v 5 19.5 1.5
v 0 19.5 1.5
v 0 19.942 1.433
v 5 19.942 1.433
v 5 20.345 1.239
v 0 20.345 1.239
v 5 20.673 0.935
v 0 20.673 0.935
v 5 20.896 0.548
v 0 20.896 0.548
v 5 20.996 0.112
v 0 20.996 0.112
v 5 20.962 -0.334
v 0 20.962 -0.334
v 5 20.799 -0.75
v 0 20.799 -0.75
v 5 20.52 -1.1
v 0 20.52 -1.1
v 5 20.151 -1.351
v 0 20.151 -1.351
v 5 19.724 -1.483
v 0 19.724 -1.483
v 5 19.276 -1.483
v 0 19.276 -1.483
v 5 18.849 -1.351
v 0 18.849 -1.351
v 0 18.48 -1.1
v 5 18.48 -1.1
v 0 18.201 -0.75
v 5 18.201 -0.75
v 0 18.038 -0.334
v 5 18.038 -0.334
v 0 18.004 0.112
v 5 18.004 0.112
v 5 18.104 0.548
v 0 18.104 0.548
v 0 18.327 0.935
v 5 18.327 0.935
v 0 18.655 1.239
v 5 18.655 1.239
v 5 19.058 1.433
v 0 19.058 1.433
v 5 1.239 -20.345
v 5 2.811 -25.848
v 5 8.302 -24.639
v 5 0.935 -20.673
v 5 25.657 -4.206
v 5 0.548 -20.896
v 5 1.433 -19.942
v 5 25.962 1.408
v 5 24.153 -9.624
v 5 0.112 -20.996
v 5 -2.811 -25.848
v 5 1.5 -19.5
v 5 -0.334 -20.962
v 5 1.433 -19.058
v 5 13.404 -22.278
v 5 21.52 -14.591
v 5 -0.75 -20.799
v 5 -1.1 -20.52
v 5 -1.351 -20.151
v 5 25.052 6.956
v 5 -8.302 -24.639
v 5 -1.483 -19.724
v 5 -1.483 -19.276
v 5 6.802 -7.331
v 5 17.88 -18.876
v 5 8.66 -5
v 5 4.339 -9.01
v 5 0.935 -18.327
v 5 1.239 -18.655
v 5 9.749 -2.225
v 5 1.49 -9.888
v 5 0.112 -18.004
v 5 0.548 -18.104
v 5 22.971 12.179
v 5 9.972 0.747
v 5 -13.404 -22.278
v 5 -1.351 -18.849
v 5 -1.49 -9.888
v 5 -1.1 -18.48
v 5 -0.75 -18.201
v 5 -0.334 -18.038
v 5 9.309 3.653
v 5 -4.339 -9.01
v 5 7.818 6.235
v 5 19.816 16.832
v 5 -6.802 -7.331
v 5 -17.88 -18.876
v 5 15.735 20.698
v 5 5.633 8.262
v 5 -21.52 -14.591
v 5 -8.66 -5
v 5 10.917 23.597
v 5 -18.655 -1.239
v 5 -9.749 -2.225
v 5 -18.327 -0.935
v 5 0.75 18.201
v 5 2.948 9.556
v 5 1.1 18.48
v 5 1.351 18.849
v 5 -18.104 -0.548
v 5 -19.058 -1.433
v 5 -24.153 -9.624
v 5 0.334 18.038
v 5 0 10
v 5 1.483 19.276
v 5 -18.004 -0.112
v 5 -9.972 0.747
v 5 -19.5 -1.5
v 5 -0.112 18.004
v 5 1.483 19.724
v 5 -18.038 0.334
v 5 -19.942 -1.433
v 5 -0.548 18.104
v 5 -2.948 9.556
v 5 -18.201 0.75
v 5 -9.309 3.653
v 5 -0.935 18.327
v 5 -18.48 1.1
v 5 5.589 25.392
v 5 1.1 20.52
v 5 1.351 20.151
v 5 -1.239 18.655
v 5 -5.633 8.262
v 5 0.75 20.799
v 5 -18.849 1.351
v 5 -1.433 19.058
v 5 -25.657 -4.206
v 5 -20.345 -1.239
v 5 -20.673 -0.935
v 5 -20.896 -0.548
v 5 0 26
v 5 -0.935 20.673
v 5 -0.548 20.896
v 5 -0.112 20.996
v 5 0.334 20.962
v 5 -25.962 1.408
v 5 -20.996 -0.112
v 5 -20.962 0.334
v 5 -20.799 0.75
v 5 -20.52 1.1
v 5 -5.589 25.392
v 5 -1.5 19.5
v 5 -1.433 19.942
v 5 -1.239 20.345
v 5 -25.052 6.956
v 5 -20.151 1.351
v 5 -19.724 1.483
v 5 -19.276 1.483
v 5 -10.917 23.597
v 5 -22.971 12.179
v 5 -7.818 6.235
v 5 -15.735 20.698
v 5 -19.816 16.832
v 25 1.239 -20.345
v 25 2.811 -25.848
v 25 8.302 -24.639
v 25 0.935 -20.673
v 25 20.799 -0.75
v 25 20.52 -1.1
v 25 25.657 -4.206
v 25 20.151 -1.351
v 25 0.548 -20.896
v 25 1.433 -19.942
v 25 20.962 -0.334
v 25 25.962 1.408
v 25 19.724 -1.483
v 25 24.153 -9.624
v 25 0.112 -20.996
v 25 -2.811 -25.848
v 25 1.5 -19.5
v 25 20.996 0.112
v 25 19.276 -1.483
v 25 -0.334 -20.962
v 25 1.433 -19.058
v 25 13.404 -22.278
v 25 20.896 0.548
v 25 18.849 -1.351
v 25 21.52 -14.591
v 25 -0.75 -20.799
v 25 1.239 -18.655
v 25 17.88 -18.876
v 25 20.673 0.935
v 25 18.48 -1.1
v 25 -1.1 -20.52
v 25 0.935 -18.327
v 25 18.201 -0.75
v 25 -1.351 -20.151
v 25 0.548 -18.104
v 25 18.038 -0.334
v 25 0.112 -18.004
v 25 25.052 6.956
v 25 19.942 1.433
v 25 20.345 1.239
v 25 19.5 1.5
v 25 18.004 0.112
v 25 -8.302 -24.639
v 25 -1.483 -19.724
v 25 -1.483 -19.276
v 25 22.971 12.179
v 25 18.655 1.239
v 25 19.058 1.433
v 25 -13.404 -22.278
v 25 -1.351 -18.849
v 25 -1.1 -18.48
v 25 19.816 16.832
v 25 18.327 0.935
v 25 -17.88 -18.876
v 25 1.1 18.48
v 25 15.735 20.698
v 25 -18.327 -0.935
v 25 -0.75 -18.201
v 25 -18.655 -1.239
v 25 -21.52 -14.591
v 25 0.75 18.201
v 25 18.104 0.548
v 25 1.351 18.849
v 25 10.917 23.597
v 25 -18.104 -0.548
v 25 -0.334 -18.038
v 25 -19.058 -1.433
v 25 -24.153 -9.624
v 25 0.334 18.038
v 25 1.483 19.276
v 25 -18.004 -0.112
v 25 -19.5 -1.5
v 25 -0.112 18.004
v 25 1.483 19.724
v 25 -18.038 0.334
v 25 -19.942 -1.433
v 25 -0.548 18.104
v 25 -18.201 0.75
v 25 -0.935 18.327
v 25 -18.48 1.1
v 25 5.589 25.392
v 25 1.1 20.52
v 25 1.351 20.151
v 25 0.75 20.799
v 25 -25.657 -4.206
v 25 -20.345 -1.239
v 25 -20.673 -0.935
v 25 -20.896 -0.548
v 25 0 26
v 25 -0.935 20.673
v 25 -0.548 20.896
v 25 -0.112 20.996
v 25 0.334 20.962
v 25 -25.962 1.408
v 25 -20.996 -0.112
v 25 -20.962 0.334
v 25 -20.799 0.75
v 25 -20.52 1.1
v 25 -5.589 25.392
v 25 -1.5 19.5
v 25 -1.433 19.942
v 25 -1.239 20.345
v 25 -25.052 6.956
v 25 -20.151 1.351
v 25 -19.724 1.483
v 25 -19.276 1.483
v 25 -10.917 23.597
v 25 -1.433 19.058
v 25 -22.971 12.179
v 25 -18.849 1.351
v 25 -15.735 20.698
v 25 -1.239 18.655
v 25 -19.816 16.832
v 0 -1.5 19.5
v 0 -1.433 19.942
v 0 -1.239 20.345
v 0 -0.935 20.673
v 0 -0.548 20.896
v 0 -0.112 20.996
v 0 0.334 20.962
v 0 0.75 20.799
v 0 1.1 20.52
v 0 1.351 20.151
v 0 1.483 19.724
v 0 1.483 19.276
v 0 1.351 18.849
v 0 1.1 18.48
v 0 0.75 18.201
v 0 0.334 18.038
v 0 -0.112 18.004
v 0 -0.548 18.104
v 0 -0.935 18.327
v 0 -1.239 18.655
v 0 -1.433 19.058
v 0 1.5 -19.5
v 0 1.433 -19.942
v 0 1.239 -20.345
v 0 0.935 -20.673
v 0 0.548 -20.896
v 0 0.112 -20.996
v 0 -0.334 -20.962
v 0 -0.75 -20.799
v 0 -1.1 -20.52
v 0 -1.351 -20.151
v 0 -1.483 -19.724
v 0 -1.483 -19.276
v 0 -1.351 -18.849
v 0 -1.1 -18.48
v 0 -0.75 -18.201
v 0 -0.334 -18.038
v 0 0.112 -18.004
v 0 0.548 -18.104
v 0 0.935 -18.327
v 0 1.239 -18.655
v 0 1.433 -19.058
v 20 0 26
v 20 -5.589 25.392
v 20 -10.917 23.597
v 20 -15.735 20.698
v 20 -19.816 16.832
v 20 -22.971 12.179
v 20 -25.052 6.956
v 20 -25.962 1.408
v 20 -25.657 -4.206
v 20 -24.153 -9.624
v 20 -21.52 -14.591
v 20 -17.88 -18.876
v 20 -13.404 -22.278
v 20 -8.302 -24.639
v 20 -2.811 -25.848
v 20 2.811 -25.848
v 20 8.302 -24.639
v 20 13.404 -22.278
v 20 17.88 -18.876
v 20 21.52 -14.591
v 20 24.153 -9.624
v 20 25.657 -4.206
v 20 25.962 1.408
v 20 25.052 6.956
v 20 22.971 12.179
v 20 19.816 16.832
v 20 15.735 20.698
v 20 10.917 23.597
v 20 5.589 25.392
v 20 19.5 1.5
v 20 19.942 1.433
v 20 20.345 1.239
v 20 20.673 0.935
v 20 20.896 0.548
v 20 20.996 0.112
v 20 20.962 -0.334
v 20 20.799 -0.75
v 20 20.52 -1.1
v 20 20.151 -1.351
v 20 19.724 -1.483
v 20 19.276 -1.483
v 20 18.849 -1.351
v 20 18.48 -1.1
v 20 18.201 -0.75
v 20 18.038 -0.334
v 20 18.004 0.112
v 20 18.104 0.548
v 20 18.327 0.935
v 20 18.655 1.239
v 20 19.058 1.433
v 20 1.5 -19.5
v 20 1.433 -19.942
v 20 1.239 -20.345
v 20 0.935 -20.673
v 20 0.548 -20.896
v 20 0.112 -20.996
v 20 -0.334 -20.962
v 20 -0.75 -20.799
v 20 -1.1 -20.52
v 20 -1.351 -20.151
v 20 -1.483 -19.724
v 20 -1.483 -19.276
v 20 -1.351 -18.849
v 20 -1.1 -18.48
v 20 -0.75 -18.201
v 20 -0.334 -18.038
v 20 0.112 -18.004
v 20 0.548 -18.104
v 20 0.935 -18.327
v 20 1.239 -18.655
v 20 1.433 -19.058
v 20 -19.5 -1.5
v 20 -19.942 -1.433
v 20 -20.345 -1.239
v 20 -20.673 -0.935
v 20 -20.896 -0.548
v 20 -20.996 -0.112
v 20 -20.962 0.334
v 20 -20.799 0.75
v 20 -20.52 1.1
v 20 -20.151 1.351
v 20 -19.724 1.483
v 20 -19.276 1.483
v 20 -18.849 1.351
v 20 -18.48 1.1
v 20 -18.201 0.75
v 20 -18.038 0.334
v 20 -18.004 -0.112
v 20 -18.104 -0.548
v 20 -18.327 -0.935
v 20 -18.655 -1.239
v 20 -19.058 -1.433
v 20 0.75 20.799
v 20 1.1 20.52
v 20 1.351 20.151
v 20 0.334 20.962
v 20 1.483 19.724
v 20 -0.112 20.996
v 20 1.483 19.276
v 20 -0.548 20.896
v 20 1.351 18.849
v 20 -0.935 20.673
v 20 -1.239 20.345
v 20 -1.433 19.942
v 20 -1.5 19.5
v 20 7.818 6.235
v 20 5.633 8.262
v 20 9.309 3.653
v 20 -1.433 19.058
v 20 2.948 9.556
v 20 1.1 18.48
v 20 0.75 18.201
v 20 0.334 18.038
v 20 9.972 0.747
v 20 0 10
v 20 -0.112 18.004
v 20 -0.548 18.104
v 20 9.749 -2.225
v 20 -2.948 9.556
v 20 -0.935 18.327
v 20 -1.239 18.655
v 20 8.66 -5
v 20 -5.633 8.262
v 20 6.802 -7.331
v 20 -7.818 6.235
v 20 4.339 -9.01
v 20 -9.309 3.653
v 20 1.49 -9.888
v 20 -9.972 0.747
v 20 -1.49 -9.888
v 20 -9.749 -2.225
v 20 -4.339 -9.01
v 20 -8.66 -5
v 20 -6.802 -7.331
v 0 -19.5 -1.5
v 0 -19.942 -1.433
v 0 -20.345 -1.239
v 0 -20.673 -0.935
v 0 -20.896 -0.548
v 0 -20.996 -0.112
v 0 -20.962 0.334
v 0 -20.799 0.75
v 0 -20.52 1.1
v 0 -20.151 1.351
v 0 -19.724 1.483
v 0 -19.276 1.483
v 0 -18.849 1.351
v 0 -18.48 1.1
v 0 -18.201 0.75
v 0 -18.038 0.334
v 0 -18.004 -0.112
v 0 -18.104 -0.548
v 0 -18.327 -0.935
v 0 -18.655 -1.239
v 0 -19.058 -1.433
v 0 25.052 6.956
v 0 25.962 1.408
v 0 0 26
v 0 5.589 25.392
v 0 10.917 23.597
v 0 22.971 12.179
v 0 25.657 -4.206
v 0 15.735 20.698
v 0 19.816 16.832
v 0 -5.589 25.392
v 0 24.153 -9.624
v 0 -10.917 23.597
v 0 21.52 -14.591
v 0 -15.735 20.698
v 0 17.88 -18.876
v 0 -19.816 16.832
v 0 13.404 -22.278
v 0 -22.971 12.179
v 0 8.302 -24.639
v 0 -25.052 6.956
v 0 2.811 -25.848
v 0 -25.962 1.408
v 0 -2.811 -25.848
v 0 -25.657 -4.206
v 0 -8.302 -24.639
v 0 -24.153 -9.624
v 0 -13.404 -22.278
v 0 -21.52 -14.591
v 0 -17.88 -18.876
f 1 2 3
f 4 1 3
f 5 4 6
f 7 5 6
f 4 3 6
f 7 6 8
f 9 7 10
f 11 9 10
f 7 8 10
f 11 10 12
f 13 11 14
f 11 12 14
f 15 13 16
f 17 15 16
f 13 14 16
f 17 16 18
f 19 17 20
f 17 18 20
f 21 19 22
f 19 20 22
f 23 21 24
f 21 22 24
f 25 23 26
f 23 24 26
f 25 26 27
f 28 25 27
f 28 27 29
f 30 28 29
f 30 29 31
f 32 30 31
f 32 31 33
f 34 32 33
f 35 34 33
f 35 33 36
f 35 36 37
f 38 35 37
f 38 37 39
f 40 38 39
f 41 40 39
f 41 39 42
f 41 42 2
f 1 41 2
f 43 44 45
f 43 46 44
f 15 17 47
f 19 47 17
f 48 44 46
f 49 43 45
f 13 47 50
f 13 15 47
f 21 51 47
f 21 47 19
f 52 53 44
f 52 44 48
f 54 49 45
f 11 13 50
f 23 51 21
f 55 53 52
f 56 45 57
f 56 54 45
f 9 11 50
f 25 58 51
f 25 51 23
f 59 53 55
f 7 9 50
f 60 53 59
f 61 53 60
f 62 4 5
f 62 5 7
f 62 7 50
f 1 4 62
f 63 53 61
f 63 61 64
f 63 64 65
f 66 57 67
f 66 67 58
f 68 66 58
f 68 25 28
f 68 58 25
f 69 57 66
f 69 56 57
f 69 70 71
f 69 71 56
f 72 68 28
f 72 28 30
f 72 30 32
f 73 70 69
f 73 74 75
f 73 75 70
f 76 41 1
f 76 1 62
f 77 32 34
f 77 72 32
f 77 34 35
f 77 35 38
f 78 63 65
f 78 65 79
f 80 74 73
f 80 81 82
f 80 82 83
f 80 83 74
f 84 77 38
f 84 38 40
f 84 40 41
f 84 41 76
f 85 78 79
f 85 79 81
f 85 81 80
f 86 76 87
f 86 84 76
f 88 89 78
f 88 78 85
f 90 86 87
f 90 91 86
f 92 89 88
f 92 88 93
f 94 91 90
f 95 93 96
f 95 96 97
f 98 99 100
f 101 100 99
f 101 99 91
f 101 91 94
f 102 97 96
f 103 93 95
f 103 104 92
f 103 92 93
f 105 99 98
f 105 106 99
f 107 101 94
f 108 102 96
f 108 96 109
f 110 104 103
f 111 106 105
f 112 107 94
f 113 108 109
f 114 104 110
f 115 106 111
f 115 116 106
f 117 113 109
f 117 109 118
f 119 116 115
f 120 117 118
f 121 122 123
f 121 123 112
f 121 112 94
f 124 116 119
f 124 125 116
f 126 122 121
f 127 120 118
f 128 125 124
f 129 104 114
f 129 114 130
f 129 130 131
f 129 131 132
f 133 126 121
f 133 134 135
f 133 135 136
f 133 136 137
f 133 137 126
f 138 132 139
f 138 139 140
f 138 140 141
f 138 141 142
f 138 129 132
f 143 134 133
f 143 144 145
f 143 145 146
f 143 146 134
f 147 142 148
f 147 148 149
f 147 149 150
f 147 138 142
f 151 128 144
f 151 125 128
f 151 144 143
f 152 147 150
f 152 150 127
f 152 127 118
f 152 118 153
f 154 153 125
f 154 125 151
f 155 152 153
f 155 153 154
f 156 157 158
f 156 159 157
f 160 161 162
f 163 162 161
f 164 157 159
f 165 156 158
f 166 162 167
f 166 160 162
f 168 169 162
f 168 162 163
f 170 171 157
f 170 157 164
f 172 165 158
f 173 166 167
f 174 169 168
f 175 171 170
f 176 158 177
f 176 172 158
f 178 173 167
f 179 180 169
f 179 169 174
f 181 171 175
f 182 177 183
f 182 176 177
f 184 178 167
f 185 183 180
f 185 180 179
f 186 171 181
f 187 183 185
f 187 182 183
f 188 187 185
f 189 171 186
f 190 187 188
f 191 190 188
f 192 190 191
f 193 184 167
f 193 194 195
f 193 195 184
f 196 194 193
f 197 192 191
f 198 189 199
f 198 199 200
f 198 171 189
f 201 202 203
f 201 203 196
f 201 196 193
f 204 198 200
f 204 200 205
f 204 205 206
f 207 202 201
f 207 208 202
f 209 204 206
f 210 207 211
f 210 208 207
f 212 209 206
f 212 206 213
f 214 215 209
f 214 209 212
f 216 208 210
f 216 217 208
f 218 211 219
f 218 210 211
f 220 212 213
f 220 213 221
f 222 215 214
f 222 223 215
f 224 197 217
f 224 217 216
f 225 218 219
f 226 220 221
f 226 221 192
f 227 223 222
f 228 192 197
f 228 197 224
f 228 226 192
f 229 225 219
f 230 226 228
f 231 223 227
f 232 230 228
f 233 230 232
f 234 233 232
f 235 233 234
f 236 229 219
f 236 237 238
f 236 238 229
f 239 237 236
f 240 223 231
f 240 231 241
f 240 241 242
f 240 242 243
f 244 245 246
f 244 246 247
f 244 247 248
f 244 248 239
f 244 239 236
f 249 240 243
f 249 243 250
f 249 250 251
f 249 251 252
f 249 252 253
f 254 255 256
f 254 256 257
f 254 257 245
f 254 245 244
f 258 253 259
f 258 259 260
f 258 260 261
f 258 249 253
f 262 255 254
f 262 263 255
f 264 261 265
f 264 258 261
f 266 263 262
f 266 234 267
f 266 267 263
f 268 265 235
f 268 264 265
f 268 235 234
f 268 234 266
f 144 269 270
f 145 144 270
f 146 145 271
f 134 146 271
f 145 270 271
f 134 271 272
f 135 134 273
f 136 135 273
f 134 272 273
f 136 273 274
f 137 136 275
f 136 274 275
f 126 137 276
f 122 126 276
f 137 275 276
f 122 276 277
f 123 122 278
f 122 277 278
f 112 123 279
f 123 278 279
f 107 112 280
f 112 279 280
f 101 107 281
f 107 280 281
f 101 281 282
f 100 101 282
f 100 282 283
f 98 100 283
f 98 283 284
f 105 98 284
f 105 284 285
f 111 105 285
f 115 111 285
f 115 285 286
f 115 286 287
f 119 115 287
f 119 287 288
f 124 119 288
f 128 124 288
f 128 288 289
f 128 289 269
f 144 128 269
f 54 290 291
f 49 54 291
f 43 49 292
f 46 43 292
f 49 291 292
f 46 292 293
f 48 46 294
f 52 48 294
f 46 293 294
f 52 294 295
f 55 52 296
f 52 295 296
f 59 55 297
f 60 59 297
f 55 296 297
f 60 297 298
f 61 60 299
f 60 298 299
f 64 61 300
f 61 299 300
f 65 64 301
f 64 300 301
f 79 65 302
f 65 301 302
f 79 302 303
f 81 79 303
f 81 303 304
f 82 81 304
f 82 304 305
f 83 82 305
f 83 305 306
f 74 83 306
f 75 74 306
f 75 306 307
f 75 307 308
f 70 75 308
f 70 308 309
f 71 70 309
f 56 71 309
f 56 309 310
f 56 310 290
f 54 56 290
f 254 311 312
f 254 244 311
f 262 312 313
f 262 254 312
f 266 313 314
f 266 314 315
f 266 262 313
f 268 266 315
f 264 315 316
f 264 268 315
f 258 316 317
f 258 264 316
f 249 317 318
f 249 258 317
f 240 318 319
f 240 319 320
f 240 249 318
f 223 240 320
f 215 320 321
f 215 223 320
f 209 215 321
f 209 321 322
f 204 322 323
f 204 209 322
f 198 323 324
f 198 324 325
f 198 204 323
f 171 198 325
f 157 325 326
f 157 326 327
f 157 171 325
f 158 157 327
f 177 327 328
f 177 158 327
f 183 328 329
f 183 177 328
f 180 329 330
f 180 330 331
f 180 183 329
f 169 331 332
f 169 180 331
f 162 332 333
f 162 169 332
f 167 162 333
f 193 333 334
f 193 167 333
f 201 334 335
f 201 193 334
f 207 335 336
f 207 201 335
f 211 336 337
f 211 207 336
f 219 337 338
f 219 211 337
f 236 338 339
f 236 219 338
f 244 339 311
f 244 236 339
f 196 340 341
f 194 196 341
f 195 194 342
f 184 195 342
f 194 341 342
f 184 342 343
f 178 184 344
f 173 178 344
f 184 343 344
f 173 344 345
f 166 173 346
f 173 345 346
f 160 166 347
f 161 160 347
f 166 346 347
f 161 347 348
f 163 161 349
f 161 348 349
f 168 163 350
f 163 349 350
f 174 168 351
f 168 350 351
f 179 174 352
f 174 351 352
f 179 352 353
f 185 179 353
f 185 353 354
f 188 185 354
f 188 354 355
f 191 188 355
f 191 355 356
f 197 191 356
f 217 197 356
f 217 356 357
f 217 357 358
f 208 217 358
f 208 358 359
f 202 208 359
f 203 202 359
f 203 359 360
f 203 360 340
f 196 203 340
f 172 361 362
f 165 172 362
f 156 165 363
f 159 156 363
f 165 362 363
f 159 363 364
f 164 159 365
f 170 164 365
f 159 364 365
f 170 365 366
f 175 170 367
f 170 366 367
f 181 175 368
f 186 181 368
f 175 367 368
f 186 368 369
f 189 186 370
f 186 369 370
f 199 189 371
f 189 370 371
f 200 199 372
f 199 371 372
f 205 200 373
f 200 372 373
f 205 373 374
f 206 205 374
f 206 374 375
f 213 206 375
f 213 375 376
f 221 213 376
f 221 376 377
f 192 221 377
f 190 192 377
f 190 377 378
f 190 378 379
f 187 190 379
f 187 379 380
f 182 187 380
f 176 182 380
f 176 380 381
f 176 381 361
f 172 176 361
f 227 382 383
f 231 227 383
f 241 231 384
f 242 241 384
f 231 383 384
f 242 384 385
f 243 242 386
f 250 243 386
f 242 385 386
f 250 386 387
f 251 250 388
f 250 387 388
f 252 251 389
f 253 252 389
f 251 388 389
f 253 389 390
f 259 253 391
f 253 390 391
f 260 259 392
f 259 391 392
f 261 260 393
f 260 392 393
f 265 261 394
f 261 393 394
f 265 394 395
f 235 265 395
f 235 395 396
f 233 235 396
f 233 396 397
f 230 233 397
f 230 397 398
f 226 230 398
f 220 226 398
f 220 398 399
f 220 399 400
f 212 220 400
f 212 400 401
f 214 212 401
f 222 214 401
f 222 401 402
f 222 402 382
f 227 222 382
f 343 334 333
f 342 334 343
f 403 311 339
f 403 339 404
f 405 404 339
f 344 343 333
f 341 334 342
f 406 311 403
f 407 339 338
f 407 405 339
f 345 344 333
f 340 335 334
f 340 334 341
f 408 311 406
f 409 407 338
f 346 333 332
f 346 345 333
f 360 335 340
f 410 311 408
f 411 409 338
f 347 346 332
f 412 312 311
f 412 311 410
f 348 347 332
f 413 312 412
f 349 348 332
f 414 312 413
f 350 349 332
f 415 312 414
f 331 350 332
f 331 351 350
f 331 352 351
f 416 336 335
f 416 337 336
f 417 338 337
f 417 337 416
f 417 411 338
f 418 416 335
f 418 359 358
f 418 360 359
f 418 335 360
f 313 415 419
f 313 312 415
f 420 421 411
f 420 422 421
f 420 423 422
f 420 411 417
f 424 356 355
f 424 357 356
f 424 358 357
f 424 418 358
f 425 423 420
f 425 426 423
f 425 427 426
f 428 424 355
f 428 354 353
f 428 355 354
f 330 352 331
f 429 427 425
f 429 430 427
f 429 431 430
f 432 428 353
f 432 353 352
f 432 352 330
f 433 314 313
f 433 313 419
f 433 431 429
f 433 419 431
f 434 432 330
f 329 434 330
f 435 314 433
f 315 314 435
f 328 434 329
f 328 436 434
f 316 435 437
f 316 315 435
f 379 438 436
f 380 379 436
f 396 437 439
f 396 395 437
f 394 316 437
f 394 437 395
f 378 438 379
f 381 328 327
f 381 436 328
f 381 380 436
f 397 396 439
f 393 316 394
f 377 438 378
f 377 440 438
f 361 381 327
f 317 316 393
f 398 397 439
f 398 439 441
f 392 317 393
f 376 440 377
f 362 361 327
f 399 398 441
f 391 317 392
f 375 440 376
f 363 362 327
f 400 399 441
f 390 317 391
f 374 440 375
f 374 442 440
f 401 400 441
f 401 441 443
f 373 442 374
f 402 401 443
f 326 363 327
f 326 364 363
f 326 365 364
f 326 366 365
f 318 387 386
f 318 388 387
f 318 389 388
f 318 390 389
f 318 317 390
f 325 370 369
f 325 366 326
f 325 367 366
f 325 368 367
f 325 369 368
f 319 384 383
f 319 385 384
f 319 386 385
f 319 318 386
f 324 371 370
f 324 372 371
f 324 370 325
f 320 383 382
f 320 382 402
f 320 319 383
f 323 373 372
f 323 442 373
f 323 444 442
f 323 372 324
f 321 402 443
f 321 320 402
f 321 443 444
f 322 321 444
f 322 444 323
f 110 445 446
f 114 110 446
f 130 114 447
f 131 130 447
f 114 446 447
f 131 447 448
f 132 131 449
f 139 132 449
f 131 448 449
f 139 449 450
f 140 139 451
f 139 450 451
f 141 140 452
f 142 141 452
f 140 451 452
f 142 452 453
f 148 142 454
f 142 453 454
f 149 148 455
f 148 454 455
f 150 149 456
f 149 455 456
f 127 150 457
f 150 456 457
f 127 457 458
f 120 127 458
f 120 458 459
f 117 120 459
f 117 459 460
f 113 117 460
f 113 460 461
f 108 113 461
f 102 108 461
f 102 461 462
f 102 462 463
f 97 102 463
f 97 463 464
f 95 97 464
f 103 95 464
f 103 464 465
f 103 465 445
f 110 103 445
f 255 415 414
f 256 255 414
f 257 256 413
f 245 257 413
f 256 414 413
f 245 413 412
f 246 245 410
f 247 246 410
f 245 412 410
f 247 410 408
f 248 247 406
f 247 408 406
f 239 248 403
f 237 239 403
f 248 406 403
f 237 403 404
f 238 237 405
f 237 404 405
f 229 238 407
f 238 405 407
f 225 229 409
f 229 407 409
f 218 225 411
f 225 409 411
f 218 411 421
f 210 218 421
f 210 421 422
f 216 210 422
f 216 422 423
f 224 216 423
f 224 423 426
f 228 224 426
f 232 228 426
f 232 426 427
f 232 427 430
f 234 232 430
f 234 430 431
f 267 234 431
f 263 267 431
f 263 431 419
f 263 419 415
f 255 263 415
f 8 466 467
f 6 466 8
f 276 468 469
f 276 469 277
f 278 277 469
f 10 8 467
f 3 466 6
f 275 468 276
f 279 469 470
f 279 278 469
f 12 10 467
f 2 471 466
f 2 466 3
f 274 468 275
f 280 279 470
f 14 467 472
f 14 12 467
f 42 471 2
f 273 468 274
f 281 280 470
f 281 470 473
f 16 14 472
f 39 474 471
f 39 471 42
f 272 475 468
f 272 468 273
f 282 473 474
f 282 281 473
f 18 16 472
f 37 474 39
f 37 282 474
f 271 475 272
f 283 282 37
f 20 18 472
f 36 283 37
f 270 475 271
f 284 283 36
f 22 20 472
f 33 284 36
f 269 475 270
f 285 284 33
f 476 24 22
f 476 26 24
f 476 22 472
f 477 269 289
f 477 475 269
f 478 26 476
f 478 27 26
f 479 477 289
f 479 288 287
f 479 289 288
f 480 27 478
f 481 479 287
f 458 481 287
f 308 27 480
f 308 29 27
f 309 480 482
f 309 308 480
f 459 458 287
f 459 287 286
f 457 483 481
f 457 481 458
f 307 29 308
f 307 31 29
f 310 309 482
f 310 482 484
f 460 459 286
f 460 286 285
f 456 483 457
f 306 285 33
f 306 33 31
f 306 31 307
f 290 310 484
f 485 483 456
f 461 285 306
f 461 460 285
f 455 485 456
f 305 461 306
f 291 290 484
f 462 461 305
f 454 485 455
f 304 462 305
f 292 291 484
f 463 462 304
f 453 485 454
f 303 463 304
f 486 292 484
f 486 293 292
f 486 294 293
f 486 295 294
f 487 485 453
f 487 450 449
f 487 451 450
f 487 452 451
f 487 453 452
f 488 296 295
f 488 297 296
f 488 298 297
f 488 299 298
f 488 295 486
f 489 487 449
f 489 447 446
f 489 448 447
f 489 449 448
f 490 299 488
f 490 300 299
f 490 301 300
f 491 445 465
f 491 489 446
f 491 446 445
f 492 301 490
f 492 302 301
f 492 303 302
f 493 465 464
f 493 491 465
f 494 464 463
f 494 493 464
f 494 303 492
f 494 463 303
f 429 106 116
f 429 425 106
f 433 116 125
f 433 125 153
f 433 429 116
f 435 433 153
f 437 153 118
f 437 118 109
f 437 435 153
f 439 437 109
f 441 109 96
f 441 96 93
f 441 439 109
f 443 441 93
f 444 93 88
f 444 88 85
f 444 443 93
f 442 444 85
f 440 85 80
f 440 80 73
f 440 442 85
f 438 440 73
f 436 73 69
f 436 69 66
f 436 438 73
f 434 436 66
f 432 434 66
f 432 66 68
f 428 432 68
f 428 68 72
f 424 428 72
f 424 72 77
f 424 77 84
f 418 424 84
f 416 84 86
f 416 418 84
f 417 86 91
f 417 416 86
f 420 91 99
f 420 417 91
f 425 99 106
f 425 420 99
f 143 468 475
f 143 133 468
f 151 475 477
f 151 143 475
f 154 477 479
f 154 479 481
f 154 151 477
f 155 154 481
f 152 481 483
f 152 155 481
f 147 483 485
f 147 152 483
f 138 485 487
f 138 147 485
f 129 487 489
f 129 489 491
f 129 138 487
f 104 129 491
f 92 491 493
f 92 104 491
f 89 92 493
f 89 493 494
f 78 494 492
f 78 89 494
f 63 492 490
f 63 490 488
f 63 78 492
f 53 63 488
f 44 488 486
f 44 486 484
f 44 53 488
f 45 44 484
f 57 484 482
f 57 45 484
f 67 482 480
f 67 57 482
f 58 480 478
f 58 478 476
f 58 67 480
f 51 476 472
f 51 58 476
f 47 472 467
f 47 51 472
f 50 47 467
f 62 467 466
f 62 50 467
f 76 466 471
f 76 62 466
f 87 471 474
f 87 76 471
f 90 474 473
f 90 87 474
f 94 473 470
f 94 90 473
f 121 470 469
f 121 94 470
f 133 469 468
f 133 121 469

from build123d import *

# Parameters (mm, degrees)
SKETCH_2_R               = 1.5
CUT_EXTRUDE_1_DEPTH      = 45.463468151
PATTERN_CIRCULAR_1_COUNT = 4


with BuildPart() as part:
    # Эскиз1 → Повернуть1 (revolve)
    with BuildSketch(Plane.XY):
        Polygon((0, 0), (0, 26), (5, 26), (5, 10), (20, 10), (20, 26), (25, 26), (25, 0), align=None)
    revolve(axis=Axis((0, 0, 0), (1, 0, 0)))

    # Эскиз2 → Вырез-Вытянуть1 (cut, through all)
    with BuildSketch(Plane.ZY):
        with Locations((0, 19.5)):
            Circle(SKETCH_2_R)
    cut_extrude_1 = extrude(amount=-CUT_EXTRUDE_1_DEPTH, mode=Mode.SUBTRACT)

    # Круговой массив1: Вырез-Вытянуть1 ×4 about axis
    pattern_circular_1_axis = Axis((5, 0, 0), (-1, 0, 0))
    for i in range(1, PATTERN_CIRCULAR_1_COUNT):
        add(cut_extrude_1.rotate(pattern_circular_1_axis, i * 360 / PATTERN_CIRCULAR_1_COUNT), mode=Mode.SUBTRACT)


solid = part.part
